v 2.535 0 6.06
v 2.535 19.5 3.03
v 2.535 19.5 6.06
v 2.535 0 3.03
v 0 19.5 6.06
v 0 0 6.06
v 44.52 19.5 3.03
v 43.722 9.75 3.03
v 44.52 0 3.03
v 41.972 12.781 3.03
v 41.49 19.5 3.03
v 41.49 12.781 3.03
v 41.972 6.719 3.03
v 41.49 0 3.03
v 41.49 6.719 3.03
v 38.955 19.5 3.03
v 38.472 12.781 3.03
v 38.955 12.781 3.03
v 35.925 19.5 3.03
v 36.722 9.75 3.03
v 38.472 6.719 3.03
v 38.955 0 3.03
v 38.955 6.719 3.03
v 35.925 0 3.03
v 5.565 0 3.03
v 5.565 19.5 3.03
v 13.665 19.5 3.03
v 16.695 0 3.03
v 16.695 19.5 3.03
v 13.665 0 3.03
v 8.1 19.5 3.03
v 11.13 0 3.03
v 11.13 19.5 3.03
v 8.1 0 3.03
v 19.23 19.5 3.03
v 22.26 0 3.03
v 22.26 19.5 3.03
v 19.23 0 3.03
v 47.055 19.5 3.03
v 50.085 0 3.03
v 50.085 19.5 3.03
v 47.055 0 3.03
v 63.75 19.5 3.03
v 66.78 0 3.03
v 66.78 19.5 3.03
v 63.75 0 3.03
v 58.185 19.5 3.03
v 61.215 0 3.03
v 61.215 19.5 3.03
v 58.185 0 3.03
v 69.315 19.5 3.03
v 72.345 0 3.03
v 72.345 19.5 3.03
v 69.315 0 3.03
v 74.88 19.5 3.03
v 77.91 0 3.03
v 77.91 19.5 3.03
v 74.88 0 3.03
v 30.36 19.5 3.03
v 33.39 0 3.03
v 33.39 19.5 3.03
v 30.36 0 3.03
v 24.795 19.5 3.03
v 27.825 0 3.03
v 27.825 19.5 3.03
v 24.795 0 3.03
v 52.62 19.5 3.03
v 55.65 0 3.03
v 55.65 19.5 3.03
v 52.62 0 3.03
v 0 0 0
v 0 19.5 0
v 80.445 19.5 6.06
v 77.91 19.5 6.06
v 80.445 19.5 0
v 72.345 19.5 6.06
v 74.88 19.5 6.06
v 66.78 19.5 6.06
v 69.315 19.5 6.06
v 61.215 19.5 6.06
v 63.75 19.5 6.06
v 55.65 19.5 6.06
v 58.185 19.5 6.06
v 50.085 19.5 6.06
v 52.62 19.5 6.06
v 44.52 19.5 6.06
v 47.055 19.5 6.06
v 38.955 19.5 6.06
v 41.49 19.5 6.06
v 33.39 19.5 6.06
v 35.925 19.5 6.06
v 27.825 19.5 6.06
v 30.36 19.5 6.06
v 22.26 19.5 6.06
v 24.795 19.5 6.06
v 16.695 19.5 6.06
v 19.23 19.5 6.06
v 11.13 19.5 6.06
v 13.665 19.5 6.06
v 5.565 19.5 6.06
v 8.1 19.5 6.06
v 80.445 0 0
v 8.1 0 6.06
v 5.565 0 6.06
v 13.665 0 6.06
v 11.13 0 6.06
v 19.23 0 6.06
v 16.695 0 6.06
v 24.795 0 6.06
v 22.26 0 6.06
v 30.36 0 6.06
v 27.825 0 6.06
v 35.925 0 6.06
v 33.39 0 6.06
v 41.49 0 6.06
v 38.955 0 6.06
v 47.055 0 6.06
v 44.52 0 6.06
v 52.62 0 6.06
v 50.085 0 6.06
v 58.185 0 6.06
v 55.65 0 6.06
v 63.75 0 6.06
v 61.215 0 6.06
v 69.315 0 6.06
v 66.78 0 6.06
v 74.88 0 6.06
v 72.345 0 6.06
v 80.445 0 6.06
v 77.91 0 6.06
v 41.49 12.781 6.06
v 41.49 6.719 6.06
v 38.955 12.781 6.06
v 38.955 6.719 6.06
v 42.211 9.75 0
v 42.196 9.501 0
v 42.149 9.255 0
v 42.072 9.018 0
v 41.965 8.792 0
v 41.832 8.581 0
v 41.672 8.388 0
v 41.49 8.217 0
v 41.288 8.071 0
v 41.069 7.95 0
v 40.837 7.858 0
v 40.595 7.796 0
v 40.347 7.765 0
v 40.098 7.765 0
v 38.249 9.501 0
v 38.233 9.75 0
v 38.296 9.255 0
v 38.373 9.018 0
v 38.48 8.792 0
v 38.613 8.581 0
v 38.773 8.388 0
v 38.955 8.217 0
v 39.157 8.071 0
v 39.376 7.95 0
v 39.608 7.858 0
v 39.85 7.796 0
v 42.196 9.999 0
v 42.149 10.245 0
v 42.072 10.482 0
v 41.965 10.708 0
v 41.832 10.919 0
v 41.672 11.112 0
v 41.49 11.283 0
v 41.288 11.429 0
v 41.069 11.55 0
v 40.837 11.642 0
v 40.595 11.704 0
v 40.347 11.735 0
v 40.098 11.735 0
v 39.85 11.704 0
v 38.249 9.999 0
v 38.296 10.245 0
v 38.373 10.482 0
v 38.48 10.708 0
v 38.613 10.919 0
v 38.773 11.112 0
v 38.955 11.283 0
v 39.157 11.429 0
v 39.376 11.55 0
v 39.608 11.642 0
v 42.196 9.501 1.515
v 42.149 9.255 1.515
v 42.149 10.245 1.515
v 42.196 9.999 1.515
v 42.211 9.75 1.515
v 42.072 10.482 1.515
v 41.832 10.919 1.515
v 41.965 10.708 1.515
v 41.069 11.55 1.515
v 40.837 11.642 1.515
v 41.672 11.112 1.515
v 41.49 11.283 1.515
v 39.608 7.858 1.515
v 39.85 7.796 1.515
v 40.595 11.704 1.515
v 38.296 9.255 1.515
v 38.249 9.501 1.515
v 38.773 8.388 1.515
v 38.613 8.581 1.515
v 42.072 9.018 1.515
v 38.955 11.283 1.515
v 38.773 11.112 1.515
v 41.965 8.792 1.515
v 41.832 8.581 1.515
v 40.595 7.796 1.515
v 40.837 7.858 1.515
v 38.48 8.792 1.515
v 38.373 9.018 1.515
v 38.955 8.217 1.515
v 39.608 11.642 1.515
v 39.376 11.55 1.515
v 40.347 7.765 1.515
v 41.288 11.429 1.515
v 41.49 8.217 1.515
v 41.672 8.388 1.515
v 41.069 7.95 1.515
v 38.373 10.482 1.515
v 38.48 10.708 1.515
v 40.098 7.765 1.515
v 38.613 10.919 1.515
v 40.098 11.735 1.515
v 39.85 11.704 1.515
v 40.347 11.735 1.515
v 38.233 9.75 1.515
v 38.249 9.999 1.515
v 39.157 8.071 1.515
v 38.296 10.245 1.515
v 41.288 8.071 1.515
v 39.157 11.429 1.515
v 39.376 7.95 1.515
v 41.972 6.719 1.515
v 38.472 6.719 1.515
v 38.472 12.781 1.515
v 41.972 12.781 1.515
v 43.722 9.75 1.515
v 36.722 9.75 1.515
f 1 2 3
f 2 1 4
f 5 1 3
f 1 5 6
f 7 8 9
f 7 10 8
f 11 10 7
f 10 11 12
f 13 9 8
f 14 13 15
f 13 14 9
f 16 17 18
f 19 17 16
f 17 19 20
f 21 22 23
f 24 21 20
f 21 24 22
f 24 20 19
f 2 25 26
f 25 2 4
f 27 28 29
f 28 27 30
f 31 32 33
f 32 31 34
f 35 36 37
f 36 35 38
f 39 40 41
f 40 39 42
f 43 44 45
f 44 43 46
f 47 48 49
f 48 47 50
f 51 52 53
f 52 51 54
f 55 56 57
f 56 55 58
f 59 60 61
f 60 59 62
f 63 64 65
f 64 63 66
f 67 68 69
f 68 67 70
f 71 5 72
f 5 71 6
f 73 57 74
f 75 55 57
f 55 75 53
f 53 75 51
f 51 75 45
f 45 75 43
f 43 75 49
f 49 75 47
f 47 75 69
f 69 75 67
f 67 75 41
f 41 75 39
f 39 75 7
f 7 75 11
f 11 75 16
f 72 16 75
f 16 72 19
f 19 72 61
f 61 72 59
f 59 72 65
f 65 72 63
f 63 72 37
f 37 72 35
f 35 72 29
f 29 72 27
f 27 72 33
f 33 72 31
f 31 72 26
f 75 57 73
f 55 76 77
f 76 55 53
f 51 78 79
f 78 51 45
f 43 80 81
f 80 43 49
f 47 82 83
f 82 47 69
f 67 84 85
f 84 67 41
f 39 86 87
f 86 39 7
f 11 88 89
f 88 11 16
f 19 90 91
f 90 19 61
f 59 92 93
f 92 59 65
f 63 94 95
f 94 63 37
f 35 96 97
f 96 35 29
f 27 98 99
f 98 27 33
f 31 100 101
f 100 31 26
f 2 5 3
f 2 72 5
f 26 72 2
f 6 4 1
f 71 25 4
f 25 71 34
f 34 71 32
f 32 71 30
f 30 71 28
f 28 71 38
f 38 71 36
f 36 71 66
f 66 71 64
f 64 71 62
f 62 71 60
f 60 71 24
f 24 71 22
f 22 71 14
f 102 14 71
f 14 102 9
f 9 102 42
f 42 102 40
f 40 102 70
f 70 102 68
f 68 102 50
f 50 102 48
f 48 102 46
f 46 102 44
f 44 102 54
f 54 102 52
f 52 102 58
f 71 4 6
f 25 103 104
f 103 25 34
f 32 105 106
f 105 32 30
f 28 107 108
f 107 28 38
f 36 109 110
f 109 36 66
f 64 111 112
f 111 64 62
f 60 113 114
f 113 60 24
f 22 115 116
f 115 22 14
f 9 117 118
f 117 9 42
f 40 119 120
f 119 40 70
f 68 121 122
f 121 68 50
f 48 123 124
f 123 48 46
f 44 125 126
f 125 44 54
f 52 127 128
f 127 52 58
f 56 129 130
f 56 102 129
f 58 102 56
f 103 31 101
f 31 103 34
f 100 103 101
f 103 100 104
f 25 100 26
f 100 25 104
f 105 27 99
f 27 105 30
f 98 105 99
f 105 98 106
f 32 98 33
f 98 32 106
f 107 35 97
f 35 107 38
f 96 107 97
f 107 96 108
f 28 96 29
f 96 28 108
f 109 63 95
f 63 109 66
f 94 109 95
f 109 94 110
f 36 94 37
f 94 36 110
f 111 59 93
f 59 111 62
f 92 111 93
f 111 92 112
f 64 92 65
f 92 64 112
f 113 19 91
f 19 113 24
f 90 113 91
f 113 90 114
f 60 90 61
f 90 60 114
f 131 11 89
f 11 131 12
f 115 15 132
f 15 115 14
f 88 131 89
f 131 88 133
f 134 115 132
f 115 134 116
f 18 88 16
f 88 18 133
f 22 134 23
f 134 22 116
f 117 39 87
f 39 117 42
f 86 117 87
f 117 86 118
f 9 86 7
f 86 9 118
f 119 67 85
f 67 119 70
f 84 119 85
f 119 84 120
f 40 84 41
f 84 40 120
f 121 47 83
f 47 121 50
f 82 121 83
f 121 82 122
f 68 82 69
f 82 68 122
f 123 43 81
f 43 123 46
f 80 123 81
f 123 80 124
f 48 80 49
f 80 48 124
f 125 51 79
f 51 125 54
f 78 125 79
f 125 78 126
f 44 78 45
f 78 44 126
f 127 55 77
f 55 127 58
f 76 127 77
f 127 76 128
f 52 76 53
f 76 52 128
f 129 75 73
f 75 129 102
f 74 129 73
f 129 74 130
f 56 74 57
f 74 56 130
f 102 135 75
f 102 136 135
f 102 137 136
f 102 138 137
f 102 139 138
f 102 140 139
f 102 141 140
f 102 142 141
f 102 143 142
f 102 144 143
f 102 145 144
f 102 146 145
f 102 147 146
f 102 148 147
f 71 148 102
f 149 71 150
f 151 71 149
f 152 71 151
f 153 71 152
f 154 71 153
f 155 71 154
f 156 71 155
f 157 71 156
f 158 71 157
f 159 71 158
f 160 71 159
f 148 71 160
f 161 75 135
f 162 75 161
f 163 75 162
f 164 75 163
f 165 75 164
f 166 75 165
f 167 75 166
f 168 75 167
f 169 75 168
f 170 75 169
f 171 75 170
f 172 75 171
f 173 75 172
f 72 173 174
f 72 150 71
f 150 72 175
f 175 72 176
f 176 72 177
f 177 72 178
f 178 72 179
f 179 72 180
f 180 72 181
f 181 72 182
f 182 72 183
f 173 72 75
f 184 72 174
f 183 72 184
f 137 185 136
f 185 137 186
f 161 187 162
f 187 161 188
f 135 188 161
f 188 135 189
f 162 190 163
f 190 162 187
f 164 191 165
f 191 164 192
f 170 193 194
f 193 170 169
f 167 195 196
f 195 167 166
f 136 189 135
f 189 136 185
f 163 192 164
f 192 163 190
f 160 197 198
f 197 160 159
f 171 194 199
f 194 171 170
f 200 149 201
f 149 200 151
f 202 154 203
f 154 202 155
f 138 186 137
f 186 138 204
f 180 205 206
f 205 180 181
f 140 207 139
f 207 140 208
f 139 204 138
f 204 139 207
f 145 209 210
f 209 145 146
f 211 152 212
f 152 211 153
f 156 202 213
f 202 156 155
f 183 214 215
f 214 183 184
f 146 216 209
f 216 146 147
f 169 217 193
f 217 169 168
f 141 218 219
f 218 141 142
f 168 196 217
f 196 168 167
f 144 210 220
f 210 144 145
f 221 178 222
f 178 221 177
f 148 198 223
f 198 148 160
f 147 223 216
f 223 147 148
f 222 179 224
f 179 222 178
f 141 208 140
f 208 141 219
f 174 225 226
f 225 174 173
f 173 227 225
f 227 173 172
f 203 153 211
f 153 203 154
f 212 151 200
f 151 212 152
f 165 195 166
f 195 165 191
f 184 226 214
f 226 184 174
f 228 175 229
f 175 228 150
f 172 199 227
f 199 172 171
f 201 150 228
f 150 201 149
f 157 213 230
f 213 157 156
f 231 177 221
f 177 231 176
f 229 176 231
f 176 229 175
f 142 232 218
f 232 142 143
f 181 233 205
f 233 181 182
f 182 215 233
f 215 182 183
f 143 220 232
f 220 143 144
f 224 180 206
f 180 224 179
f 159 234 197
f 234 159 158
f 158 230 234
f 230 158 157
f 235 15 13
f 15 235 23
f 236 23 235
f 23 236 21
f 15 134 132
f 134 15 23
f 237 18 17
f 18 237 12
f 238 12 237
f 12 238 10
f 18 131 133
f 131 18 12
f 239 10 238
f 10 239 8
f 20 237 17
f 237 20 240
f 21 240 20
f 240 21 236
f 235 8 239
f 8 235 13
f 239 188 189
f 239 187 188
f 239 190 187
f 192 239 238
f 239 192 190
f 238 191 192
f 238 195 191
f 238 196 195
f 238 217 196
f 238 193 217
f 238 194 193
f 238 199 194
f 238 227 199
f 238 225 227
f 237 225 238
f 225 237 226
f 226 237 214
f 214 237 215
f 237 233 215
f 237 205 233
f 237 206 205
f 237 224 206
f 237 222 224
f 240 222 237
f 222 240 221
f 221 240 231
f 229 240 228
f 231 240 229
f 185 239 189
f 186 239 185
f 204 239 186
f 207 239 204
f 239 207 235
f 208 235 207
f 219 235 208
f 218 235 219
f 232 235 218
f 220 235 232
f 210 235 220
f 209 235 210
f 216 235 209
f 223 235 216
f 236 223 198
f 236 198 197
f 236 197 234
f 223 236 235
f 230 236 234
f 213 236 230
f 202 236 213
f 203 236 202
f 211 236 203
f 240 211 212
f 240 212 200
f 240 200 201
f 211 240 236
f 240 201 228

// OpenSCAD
/*

        Super Customizable Lego Technic Beam
        Modified by Christopher Litsinger
        January 2018

    Inspired by TUSH - A remix of many!
    by spongybob1958, published Sep 7, 2017
    https://www.thingiverse.com/thing:2521463
*/

/* [Customize] */
//the maximum length of the overall rail
rail_length_max=80;
//the size of the gaps 
gap_length=3.03;
//the size of the peaks 
peak_length=2.535;
//how wide should the rail be
rail_width = 19.5;
//do you want screw tabs on the end?
screw_tabs = "no"; // [yes, no]
//do you want a center m4 hole?
center_hole="yes"; //[yes, no]
//what is the radius for the screws you're using to attach the rail
screw_radius = 3;

// preview[view:south, tilt:top]
// Model - Start

tab_offset = (screw_tabs == "yes") ? rail_width : 0;

segment_height = max(gap_length, peak_length);

num_segments = floor((rail_length_max - tab_offset)/(gap_length+peak_length));

module draw_tabs() {
    difference() {
        translate([num_segments*(gap_length+peak_length) + peak_length, rail_width/2, 0]) {
            cylinder(r=rail_width/2, h=segment_height*2, $fn=32);
            }
        translate([num_segments*(gap_length+peak_length) + peak_length - rail_width/2, 0, -1]) {
                cube([rail_width/2,rail_width, segment_height * 3]);
            }
        translate([num_segments*(gap_length+peak_length) + peak_length + screw_radius, rail_width/2, -1]) {
            cylinder(r=screw_radius, h=segment_height*3, $fn=32);
            }
        }
    difference() {
        translate([0, rail_width/2, 0]) {
            cylinder(r=rail_width/2, h=segment_height*2, $fn=32);
            }
        translate([0, 0, -1]) {
                cube([rail_width/2,rail_width, segment_height * 3]);
            }
        translate([-screw_radius, rail_width/2, -1]) {
            cylinder(r=screw_radius, h=segment_height*3, $fn=32);
            }
        }

}


module draw_center_hole() {
    translate([(num_segments*(gap_length+peak_length) + peak_length)/2, rail_width/2, -1]) {
        cylinder(r=1.989, h = segment_height *3, $fn=50);
        }
    translate([(num_segments*(gap_length+peak_length) + peak_length)/2, rail_width/2, segment_height - (segment_height/2)]) {
        cylinder(r=3.5, h=segment_height*2+1, $fn=6);
        }
}

difference() {
    union() {
        cube([(num_segments*(gap_length+peak_length) + peak_length), rail_width, segment_height]);
        for (ii = [0:num_segments]) {
                translate([ii*(gap_length+peak_length), 0, segment_height]) {
                    cube([(peak_length), rail_width, segment_height]);
                }
            }
        
        
        if (screw_tabs == "yes") {
            draw_tabs();
            }
        }    
    if (center_hole == "yes") draw_center_hole();
}
